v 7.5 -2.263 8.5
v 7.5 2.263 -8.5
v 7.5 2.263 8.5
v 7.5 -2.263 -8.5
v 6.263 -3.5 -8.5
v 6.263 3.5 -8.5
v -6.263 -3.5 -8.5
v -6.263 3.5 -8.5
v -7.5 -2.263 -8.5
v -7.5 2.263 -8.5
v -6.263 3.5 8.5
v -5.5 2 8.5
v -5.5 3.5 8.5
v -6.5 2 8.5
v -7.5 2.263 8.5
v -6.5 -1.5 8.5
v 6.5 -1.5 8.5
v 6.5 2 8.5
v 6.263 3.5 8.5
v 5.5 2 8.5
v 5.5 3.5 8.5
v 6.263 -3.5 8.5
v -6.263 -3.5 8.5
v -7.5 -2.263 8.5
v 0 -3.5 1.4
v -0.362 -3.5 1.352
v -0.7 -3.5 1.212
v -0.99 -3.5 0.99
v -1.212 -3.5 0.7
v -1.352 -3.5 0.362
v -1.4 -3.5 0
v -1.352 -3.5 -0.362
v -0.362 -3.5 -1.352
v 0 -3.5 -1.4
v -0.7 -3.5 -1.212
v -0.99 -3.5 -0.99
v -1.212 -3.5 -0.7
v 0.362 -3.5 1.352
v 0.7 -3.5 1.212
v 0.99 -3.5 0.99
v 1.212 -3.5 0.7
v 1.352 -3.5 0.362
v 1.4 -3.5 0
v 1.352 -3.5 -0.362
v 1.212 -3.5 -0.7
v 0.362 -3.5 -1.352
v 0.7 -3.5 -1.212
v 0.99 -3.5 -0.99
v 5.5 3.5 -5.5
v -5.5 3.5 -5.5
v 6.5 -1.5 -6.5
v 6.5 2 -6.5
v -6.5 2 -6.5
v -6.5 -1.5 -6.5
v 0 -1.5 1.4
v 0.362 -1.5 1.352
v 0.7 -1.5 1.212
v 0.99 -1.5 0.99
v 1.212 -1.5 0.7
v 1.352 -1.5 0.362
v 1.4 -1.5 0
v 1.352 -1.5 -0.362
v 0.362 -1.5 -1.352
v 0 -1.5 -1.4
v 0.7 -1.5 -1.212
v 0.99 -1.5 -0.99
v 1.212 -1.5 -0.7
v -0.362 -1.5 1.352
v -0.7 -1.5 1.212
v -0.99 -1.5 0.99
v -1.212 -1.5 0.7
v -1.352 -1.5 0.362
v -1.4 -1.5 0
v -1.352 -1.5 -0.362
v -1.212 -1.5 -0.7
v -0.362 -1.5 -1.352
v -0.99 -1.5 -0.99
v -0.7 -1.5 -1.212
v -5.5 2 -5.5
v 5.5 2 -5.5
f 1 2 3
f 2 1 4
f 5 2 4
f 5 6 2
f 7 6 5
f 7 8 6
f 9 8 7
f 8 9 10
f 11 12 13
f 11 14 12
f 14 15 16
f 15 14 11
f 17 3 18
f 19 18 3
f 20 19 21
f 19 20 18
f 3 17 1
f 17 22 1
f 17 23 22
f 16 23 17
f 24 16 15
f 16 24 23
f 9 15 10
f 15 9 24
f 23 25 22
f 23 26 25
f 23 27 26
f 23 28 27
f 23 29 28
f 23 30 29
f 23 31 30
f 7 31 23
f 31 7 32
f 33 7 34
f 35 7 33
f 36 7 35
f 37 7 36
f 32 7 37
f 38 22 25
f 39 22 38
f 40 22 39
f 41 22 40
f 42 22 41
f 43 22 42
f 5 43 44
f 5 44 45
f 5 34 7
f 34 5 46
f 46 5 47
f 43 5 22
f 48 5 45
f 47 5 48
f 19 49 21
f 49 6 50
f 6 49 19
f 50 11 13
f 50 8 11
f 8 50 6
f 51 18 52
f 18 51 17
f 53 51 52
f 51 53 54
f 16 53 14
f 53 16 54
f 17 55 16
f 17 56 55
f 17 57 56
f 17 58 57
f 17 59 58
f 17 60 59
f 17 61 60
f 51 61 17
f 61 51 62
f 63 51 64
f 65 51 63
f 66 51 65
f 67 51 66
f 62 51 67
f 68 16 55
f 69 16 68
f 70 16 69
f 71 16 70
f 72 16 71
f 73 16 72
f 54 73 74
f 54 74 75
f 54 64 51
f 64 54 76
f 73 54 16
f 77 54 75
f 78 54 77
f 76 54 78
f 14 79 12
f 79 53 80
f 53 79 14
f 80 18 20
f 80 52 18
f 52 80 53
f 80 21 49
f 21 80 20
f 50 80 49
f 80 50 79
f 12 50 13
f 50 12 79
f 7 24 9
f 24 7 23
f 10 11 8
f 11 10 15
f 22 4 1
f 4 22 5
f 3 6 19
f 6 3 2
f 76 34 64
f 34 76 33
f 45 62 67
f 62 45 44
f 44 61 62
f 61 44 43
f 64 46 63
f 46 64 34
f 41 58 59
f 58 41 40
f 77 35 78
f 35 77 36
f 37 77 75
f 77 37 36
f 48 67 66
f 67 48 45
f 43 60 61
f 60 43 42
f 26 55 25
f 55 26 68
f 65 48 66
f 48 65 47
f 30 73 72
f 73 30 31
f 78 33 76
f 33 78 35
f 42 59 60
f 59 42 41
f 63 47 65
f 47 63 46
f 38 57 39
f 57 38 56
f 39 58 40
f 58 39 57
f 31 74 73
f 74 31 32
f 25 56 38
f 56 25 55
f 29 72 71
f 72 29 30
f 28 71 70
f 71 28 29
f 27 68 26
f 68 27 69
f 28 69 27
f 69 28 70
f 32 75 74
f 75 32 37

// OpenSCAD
module clip(lgt,wid,hgt,rad) {
   difference() {
     cube([lgt,wid,hgt],center=true);
     translate([0,-0.25,-2])
             cube([lgt-2,(4*wid/7)-0.5,hgt],center=true);
     translate([0,-wid/2,-3])
             cube([lgt-4,wid,hgt],center=true);

      translate([-lgt/2,wid/2,0])
         rotate([0,0,45])
           cube([lgt,wid/4,hgt+2],            center=true);
        translate([-lgt/2,-wid/2,0])
         rotate([0,0,-45])
           cube([lgt,wid/4,hgt+2],            center=true);
        translate([lgt/2,wid/2,0])
         rotate([0,0,-45])
           cube([lgt,wid/4,hgt+2],            center=true);
        translate([lgt/2,-wid/2,0])
         rotate([0,0,45])
           cube([lgt,wid/4,hgt+2],            center=true);
       rotate([90,0,0])
            cylinder(r=rad,h=10,center=true, $fn=24);
   }

}

rotate([180,0,0]) clip(15,7,17,1.4);
